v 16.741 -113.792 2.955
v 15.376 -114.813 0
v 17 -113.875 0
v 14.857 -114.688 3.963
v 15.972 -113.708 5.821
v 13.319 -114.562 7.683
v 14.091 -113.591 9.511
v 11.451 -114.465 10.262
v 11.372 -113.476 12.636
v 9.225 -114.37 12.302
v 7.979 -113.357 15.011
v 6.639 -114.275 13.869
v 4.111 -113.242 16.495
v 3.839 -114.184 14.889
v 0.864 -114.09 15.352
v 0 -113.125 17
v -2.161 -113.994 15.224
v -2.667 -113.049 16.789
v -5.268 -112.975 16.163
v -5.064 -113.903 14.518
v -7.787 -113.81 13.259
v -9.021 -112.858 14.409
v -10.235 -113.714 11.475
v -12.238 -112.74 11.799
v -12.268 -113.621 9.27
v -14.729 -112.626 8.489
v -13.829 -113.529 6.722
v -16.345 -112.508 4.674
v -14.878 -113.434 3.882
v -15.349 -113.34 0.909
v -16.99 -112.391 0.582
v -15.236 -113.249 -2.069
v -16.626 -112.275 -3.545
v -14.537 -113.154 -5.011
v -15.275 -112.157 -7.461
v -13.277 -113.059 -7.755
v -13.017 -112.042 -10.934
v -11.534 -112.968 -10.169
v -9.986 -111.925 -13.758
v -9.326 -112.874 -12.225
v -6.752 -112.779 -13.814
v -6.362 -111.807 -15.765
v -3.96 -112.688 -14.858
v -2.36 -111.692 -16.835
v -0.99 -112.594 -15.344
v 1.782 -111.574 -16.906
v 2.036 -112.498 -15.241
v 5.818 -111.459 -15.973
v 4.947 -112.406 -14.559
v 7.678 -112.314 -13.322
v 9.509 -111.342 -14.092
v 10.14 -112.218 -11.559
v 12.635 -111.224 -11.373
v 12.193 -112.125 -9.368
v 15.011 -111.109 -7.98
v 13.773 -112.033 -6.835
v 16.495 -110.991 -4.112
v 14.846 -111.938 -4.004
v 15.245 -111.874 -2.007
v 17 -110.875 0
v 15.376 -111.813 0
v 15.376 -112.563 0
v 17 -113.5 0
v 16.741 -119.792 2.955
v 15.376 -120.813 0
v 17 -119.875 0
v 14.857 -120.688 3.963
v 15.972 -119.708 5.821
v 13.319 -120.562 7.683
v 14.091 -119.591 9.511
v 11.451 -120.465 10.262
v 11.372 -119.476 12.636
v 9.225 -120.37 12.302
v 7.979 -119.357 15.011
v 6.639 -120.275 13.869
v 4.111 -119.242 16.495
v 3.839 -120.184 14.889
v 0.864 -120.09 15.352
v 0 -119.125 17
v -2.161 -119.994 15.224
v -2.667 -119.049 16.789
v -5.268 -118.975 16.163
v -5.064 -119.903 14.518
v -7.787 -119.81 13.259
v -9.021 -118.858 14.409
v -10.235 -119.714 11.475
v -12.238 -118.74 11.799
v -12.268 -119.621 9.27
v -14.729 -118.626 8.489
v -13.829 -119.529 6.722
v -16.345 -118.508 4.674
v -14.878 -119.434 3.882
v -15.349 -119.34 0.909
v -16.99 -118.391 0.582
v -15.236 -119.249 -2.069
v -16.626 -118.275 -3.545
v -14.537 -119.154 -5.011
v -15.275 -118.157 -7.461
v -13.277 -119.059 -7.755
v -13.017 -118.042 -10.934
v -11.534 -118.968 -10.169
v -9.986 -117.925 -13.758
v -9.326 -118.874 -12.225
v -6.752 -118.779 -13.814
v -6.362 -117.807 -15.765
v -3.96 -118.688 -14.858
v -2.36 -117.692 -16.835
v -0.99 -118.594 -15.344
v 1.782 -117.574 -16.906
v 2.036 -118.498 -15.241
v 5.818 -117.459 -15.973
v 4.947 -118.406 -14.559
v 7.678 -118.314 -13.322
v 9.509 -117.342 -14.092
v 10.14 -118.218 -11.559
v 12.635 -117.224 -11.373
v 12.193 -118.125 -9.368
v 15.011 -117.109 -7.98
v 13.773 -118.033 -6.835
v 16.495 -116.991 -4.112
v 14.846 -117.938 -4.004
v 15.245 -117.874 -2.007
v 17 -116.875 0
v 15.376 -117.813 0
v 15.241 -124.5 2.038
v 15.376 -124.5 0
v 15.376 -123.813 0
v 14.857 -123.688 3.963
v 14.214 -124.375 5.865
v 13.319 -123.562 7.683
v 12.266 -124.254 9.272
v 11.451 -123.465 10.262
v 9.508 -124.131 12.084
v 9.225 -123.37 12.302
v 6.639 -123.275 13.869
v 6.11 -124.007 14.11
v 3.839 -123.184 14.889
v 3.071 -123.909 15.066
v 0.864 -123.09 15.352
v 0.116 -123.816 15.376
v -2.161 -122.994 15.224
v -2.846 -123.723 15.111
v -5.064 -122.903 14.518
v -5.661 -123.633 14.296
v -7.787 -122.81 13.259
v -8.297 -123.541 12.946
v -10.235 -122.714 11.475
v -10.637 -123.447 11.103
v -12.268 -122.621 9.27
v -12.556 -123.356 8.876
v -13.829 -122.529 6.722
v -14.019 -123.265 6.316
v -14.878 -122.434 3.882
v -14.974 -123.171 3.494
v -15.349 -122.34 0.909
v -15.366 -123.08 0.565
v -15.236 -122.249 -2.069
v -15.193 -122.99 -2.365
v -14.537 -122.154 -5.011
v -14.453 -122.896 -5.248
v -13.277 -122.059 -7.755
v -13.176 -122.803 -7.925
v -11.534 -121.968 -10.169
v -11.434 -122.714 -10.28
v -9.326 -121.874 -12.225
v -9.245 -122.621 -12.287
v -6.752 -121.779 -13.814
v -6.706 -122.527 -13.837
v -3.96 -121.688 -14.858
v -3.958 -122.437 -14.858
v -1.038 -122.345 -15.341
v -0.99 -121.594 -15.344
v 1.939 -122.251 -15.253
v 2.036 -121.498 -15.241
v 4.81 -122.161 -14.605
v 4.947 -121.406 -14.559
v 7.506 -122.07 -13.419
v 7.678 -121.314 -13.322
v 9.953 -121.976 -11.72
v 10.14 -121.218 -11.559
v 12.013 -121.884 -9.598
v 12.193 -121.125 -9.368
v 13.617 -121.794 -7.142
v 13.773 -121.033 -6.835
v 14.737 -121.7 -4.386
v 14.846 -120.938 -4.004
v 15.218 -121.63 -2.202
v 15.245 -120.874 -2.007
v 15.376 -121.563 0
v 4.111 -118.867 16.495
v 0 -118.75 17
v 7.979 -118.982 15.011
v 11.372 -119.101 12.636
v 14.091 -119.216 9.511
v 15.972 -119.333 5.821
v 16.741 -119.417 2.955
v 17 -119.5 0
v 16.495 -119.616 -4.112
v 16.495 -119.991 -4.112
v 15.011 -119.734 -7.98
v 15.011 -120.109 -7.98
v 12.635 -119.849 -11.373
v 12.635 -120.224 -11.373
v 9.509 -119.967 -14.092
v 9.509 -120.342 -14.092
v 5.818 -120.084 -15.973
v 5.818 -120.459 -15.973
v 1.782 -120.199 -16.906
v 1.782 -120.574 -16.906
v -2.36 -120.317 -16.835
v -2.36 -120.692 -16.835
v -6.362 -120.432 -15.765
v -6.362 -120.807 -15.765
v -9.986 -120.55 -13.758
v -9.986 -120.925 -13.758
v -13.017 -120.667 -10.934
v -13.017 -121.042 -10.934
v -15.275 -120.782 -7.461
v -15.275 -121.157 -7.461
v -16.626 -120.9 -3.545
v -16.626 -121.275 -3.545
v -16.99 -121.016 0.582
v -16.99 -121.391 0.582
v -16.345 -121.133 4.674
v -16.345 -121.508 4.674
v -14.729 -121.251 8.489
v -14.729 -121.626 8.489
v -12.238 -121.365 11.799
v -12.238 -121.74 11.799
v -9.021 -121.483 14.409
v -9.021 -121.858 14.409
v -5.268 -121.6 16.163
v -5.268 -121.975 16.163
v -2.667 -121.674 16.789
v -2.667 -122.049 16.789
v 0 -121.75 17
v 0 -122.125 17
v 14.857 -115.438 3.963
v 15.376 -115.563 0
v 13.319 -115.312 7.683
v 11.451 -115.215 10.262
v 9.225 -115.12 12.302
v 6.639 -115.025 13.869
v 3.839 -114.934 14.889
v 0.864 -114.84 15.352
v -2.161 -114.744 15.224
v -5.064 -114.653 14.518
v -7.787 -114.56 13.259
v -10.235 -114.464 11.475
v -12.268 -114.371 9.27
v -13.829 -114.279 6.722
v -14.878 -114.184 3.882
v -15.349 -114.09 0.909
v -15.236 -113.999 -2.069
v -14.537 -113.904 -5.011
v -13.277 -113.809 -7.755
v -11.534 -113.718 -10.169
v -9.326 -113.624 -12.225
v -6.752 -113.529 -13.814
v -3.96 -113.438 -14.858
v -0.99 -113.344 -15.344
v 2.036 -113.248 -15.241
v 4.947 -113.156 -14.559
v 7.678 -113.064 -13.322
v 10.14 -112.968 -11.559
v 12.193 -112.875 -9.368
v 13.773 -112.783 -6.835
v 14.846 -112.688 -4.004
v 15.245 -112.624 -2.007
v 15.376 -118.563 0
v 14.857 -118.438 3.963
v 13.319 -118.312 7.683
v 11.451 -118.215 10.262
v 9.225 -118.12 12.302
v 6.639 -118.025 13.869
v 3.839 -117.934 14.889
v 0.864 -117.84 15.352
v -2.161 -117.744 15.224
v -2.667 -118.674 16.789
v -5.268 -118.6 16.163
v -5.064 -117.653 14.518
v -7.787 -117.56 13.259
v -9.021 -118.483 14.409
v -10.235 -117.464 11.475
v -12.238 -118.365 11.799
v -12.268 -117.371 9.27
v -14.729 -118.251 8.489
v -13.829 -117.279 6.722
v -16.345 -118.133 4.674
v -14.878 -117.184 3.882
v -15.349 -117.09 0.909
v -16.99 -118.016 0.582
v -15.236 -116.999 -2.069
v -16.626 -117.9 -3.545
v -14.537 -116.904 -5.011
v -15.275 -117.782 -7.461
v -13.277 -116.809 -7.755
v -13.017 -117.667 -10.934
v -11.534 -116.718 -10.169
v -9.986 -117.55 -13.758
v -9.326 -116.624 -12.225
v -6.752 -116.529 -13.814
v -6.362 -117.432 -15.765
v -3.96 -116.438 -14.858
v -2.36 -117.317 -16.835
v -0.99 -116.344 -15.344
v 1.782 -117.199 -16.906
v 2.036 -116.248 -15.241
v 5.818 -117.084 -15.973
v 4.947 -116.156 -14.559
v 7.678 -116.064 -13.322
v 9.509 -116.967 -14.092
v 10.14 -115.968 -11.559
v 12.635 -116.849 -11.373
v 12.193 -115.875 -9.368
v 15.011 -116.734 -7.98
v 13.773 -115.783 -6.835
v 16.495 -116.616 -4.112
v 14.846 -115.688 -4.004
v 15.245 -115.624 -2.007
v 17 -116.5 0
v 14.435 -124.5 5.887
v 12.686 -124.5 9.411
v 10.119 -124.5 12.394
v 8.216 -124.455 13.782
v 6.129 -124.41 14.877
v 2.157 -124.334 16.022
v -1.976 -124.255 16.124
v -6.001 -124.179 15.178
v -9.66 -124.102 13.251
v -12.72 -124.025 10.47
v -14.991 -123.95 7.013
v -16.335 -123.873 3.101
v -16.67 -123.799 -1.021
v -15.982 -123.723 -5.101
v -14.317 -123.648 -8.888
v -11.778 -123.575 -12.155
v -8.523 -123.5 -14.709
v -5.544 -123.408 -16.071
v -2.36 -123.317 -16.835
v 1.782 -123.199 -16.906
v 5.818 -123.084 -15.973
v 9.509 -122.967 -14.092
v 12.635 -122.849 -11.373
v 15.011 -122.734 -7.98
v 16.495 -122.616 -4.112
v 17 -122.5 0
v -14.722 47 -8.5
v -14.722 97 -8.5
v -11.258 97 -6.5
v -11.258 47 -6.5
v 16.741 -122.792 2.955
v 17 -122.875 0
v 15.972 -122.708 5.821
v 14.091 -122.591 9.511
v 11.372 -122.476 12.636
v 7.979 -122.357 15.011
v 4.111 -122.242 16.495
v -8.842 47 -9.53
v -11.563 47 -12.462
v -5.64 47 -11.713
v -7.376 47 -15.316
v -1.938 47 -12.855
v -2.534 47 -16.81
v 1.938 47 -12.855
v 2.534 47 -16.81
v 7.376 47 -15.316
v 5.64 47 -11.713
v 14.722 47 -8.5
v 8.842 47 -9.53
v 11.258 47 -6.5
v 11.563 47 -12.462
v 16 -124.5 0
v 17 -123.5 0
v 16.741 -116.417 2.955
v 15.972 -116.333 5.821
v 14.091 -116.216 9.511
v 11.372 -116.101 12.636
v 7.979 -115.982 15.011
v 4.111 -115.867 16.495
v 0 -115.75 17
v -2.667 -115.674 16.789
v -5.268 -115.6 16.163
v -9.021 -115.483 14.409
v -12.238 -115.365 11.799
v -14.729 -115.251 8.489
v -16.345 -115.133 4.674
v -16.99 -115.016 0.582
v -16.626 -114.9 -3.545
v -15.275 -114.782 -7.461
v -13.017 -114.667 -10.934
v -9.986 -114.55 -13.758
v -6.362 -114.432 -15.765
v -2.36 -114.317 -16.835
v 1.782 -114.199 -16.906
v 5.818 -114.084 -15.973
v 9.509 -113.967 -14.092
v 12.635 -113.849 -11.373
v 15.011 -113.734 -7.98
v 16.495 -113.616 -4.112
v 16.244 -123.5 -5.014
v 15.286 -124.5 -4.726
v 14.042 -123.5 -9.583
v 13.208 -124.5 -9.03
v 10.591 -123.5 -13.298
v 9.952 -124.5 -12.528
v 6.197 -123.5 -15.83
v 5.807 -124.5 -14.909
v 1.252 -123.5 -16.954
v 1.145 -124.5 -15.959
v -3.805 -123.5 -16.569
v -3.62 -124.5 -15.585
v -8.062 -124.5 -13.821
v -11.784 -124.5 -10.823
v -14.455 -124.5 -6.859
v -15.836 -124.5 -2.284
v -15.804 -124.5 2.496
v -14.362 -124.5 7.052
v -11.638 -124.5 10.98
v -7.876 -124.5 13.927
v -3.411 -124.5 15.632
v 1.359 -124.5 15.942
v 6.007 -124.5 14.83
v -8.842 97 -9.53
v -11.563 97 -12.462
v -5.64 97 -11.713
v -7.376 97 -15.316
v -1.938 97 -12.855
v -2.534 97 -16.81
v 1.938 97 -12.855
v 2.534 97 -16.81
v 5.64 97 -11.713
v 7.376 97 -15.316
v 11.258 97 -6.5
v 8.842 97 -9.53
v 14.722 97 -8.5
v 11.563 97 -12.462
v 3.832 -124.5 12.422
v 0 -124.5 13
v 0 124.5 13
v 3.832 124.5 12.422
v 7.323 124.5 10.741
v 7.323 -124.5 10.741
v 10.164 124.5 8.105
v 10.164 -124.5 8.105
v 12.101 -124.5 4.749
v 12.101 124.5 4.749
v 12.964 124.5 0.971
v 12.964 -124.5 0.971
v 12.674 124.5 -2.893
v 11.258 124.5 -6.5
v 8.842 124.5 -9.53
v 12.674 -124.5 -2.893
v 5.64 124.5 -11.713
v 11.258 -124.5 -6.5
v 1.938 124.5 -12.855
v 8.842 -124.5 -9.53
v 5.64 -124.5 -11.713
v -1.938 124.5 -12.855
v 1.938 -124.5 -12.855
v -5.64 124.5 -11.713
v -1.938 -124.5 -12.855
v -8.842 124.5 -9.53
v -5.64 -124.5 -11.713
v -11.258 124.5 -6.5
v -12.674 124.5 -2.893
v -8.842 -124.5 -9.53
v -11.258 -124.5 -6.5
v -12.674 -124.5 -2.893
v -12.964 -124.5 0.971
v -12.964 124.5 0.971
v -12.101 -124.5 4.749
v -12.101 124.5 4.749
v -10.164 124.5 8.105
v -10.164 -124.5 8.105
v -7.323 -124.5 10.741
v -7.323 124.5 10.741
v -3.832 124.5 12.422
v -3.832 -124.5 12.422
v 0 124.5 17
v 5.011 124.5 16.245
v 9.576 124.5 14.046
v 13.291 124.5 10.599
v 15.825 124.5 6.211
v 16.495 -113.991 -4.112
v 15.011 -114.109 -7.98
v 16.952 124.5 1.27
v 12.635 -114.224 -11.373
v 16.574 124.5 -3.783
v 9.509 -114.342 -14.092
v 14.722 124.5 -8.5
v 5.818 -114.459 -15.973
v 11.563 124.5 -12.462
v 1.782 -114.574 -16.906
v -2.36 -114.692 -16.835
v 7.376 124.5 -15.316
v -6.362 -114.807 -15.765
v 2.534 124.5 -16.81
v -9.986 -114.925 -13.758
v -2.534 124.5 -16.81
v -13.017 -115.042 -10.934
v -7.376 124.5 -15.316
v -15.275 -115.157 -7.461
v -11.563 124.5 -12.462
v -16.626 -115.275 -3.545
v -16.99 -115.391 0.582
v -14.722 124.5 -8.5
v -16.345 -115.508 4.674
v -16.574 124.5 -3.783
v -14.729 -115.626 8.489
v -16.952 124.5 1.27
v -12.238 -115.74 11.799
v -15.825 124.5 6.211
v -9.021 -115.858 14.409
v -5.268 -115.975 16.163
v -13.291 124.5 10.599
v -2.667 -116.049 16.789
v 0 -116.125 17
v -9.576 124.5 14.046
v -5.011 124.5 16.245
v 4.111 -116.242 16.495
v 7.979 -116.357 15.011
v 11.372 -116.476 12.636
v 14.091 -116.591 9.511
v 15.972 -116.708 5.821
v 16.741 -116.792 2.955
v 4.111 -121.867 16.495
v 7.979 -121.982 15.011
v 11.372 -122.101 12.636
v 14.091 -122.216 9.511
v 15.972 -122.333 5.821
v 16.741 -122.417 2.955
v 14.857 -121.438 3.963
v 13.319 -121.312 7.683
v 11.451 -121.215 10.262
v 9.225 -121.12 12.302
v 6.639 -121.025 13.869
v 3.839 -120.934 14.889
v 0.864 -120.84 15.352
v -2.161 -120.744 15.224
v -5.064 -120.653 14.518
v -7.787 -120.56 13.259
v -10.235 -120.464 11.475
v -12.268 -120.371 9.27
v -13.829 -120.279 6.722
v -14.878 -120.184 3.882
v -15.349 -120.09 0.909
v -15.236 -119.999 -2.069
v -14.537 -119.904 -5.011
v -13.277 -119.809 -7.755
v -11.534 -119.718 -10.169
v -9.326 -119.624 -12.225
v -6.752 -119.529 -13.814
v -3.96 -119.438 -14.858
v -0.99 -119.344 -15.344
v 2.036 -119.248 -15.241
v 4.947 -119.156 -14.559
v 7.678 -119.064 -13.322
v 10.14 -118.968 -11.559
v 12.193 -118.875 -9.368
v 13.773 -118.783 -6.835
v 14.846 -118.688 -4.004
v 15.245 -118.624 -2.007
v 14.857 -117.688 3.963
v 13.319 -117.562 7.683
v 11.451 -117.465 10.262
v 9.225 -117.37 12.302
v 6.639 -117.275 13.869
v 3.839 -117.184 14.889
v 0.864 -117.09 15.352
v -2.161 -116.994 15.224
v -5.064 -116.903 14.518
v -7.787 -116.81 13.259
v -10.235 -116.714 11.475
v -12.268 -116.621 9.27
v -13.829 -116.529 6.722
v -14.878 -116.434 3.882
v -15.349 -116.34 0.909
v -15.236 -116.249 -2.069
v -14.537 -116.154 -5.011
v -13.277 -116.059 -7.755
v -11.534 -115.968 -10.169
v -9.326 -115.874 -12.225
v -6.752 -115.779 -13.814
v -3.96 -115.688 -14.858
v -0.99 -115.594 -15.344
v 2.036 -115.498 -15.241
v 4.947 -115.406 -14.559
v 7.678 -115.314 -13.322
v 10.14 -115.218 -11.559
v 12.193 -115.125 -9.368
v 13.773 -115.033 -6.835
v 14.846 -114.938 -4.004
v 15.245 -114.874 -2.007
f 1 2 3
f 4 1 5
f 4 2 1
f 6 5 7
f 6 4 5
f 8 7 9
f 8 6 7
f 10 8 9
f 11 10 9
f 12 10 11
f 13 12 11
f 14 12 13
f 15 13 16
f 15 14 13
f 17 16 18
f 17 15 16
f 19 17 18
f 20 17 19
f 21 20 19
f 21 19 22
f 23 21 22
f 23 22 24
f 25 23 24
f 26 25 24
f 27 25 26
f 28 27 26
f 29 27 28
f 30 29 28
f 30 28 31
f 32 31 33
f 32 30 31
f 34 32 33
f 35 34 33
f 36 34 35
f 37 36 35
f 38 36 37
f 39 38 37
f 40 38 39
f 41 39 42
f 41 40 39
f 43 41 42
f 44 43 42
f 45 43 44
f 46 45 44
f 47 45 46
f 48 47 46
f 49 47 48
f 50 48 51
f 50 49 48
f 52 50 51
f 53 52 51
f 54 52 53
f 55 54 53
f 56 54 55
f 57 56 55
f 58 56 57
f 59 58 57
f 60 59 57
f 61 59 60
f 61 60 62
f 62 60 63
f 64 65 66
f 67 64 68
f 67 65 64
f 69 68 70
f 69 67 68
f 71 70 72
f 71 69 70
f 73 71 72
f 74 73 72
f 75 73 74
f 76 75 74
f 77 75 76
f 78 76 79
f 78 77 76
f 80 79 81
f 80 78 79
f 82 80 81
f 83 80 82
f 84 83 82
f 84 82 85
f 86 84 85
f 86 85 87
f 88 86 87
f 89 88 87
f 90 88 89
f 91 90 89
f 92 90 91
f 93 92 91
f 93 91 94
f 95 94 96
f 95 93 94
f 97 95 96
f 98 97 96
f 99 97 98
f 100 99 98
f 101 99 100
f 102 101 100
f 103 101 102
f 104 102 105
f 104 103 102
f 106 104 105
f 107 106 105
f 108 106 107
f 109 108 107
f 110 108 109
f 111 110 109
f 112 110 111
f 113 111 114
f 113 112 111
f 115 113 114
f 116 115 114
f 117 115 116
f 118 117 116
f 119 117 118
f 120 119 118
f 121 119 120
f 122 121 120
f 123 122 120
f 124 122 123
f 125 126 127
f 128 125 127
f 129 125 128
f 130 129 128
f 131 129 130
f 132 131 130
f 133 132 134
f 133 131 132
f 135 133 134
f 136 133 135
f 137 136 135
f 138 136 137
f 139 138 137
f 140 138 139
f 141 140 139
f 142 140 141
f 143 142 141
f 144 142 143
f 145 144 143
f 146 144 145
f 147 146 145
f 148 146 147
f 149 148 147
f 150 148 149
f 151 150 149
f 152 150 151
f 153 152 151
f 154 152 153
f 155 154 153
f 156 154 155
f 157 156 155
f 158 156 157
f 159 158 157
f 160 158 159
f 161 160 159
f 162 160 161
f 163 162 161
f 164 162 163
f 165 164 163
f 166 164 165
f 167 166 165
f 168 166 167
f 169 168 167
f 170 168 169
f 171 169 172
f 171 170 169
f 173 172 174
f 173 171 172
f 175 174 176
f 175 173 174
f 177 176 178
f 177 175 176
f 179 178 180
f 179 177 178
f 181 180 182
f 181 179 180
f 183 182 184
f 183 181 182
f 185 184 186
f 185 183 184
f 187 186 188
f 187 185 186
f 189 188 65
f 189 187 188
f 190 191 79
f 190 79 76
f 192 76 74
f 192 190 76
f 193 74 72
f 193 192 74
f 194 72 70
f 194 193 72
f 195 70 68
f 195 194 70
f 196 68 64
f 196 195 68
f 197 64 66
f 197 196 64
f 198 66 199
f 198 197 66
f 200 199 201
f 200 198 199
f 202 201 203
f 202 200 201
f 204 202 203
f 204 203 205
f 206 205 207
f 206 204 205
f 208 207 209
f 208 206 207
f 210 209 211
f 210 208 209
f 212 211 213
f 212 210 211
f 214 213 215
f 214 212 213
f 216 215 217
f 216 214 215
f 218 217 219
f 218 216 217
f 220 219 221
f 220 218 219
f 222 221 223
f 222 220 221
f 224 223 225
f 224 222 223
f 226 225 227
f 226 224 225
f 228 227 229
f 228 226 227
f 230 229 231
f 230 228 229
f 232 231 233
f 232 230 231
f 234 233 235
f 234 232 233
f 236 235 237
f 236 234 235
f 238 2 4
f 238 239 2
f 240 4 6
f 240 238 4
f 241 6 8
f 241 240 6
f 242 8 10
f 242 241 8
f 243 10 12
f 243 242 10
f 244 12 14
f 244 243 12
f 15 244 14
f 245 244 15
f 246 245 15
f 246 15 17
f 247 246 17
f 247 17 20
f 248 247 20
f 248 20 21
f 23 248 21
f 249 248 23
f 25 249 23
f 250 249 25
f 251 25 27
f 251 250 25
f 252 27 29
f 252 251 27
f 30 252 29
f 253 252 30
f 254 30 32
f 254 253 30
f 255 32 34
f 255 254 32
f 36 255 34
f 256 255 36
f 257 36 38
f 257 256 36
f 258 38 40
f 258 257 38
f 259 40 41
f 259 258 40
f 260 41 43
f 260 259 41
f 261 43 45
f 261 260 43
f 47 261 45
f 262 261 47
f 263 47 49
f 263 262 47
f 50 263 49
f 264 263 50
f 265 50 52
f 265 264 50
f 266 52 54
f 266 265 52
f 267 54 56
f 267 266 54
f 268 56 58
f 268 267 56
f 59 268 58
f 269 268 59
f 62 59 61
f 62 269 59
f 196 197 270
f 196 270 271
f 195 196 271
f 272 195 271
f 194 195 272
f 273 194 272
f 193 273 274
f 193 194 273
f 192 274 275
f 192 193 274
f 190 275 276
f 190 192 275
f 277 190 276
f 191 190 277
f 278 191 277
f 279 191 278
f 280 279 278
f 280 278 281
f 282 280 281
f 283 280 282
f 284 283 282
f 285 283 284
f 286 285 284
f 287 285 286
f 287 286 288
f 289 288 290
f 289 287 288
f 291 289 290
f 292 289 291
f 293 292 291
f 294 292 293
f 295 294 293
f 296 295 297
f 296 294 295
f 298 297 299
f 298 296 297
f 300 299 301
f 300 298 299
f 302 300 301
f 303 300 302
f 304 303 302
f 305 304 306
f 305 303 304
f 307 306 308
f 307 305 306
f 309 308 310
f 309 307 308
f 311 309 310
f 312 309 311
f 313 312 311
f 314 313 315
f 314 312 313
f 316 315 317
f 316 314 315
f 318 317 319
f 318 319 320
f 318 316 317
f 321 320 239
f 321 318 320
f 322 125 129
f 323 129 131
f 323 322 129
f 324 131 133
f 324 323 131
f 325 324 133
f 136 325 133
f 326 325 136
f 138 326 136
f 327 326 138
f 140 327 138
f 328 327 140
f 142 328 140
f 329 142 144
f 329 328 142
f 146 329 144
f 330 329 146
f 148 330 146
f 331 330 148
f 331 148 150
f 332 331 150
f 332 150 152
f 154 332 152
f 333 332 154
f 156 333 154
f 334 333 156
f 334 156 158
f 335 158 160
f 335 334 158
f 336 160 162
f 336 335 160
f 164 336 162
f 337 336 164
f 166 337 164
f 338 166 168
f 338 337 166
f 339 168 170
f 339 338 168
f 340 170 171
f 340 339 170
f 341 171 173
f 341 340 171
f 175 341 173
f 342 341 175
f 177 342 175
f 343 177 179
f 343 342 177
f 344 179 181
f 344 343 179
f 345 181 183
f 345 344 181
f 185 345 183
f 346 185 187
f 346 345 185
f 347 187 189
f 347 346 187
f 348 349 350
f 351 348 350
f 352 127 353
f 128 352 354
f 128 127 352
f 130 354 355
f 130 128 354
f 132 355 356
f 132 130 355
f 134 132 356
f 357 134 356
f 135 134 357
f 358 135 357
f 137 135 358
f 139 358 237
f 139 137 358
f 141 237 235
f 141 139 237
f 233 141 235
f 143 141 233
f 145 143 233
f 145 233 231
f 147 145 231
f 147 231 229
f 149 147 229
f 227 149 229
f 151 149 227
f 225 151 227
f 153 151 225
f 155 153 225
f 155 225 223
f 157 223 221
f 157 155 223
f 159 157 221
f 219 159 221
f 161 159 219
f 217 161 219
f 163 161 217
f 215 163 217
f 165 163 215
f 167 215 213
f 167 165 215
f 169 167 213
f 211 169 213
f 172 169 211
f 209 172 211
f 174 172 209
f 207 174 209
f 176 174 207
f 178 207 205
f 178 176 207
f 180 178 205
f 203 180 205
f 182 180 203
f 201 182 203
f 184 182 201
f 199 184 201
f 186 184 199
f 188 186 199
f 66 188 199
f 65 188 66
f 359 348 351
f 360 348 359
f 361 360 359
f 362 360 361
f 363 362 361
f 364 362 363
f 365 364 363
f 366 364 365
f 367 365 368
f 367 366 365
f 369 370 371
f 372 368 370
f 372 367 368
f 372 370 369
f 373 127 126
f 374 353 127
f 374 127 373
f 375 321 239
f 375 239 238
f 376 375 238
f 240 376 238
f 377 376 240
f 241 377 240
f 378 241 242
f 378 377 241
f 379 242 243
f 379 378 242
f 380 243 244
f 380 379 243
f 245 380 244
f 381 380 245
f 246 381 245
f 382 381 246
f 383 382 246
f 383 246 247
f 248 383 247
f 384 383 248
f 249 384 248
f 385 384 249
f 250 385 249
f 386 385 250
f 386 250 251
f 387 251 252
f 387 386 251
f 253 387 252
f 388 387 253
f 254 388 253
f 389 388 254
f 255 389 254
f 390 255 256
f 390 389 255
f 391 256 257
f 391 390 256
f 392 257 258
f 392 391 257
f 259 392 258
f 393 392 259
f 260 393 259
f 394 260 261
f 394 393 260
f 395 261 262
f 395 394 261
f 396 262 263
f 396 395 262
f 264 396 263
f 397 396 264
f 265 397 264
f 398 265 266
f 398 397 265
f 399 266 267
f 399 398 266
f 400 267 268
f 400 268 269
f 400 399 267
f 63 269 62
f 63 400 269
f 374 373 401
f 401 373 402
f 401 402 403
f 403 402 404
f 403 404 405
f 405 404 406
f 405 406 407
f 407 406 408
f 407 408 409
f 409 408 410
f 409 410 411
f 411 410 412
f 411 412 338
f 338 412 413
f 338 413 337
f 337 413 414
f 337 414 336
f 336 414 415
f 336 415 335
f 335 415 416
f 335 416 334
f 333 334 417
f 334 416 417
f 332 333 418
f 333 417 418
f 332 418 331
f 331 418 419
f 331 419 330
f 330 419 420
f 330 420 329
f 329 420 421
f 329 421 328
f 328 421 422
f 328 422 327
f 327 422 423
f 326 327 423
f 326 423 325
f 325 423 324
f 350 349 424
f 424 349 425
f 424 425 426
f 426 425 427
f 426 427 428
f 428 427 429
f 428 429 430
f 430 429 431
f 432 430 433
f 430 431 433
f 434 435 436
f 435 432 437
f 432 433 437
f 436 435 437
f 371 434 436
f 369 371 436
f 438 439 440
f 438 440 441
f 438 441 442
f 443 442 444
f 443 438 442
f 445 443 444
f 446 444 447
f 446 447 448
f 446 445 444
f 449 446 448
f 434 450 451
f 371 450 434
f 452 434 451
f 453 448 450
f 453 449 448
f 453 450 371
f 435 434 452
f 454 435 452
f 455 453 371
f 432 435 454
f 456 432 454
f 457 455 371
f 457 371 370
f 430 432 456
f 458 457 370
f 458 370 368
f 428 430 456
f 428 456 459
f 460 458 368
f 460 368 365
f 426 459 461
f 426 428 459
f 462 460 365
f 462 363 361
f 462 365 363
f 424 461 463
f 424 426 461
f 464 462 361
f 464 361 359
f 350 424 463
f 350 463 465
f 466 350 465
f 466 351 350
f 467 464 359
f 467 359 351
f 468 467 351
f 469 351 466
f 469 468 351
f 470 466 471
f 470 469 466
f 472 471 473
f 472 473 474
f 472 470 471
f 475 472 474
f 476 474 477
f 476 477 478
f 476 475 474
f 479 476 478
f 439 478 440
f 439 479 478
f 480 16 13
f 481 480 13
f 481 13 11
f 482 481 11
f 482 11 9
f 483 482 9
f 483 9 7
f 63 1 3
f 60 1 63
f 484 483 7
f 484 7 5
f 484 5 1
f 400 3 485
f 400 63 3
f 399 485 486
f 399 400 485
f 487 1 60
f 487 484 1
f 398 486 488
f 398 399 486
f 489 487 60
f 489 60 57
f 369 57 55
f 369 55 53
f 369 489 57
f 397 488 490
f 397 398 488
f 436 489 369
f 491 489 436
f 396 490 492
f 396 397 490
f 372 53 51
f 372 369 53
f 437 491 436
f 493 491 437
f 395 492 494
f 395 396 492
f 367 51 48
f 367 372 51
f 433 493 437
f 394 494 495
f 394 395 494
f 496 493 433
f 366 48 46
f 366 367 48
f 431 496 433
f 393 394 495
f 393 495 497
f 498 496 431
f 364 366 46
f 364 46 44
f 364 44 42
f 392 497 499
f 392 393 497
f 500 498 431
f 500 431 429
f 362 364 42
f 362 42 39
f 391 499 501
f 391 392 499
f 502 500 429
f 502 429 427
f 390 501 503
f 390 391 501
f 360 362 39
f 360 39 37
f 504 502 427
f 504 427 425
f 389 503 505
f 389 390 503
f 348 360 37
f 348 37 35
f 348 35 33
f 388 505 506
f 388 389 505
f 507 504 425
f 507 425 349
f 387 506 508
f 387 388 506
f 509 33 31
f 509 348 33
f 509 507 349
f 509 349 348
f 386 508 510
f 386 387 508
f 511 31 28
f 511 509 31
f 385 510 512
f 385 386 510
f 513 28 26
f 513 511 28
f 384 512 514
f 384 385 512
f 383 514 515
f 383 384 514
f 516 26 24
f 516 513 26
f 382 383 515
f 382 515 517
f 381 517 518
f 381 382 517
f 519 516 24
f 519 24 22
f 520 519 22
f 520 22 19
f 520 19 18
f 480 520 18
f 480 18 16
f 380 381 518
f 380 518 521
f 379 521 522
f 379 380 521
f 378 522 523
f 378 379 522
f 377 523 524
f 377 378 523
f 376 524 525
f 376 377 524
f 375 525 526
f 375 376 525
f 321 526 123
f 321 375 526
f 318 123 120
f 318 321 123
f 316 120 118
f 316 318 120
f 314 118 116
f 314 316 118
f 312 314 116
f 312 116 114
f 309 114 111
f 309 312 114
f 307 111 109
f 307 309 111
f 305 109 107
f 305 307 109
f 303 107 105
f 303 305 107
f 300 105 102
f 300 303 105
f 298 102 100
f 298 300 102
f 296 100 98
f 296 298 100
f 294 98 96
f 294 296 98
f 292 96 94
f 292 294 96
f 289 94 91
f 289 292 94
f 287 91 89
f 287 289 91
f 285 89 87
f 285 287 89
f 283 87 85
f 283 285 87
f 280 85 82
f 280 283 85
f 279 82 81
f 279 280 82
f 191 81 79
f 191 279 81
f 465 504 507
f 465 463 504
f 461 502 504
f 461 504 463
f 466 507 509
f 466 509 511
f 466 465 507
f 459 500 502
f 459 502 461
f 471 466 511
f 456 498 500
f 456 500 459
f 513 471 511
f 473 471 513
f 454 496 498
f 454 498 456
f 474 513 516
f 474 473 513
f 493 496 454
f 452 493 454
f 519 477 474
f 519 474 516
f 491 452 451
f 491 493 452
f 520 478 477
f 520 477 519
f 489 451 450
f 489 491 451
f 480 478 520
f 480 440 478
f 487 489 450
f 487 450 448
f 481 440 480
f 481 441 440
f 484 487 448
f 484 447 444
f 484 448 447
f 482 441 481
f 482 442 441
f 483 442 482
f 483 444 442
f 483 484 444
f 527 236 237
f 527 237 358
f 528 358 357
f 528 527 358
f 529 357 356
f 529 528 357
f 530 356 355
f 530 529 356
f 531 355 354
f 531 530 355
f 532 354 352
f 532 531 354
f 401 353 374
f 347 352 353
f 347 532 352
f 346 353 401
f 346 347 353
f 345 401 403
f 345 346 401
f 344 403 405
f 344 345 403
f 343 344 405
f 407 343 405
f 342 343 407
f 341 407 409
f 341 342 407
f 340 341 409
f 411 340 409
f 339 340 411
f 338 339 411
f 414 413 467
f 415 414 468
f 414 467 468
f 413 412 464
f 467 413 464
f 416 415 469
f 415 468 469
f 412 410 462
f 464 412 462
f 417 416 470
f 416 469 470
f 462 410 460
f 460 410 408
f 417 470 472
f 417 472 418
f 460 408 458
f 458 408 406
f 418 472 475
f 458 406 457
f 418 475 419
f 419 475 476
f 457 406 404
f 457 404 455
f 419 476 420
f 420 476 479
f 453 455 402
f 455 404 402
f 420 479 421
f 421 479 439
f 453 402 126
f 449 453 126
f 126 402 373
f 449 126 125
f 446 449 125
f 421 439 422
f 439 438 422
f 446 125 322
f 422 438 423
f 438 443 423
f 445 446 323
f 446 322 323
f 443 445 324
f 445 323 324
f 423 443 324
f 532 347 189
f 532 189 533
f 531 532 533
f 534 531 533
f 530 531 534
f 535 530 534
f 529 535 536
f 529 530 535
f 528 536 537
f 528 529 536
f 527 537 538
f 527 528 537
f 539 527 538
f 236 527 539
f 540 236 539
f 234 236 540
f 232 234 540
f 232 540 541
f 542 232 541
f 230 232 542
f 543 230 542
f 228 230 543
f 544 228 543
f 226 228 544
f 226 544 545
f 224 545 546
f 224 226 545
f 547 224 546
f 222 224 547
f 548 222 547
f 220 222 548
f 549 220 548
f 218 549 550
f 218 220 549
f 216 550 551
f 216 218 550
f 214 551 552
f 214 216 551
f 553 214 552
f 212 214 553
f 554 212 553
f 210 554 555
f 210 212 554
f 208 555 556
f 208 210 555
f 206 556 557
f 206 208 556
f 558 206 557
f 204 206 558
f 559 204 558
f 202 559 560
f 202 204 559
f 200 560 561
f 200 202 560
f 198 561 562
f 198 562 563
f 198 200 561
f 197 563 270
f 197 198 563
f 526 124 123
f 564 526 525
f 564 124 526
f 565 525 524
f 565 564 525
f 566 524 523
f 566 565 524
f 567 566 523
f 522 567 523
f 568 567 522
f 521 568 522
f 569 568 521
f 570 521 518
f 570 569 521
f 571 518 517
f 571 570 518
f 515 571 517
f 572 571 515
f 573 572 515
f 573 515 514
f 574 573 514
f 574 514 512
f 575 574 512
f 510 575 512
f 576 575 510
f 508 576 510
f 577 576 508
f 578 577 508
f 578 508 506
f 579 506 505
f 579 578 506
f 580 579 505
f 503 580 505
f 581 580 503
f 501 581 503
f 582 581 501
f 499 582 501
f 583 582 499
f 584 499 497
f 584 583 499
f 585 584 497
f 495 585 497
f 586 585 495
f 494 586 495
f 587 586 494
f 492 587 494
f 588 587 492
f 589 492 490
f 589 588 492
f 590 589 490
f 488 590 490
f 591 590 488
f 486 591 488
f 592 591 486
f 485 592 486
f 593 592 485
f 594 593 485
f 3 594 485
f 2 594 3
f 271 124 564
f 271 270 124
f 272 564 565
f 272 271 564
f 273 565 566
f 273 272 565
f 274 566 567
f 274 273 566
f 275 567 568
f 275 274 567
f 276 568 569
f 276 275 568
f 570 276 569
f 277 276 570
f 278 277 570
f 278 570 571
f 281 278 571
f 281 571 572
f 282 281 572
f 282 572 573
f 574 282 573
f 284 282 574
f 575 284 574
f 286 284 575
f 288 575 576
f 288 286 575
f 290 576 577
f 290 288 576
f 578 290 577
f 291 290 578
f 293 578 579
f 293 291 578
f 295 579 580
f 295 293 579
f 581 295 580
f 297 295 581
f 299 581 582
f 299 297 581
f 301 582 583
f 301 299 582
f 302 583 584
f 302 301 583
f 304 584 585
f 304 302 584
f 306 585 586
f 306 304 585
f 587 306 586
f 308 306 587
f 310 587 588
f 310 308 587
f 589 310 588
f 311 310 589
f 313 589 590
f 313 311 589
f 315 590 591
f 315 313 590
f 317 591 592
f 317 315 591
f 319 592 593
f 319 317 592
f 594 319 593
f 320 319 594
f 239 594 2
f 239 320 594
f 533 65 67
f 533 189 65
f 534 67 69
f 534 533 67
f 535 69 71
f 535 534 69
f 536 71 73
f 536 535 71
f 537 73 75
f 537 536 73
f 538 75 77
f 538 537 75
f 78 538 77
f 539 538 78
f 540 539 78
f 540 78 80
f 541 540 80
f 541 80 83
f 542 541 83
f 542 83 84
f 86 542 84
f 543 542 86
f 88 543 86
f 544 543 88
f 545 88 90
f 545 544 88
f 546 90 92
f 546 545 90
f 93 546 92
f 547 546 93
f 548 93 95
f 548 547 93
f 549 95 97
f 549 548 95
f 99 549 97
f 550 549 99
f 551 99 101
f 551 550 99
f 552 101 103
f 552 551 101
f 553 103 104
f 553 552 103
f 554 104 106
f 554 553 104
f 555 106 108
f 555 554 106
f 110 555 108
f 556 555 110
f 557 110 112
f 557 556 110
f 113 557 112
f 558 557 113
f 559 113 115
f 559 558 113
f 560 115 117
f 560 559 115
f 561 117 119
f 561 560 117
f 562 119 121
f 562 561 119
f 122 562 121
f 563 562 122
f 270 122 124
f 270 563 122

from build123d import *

# Parameters (mm, degrees)
SKETCH1_R           = 17
SKETCH1_R_2         = 13
BOSS_EXTRUDE1_DEPTH = 124.5
CUT_EXTRUDE2_START  = 10
CUT_EXTRUDE2_DEPTH  = 50
THREAD1_PITCH       = 3
CHAMFER2_SIZE       = 1


with BuildPart() as part:
    # Sketch1 → Boss-Extrude1 (new, symmetric)
    with BuildSketch(Plane(origin=(0, 0, 0), x_dir=(1, 0, 0), z_dir=(0, 1, 0))):
        with Locations(Location((0, 0, 0), (0, 0, 270))):
            Circle(SKETCH1_R)
        with Locations(Location((0, 0, 0), (0, 0, 270))):
            Circle(SKETCH1_R_2, mode=Mode.SUBTRACT)
    extrude(amount=BOSS_EXTRUDE1_DEPTH, both=True)

    # Sketch3 → Cut-Extrude2 (cut)
    with BuildSketch(Plane(origin=(0, 87, 0), x_dir=(1, 0, 0), z_dir=(0, 1, 0)).offset(CUT_EXTRUDE2_START)):
        with BuildLine():
            Line((0, 0), (14.722431864, 8.5))
            ThreePointArc((14.722431864, 8.5), (0, 17), (-14.722431864, 8.5))
            Line((-14.722431864, 8.5), (0, 0))
        make_face()
    extrude(amount=-CUT_EXTRUDE2_DEPTH, mode=Mode.SUBTRACT)

    # Thread1: the profile of Thread Profile1 profile screwed along a left-hand helix of 4 turns, 10 arcs to a turn; built about Z, then put on its axis
    thread1_z = Axis((0, 0, 0), (0, 0, 1))
    thread1_corners = [(17.0003, 0, -0.000173205), (17.0003, 0, 2.625173197), (15.376202375, 0, 1.687499996), (15.376202375, 0, 0.937499996)]
    with BuildLine(mode=Mode.PRIVATE) as thread1_profile:
        Line(thread1_corners[0], thread1_corners[1])
        Line(thread1_corners[1], thread1_corners[2])
        Line(thread1_corners[2], thread1_corners[3])
        Line(thread1_corners[3], thread1_corners[0])
    thread1_cap = Face(thread1_profile.wire())
    thread1_turn_angles = [0, -18, -36, -54, -72, -90, -108, -126, -144, -162, -180, -198, -216, -234, -252, -270, -288, -306, -324, -342, -360]
    thread1_turn_weights = [1, 0.9510565162951535, 1, 0.9510565162951535, 1, 0.9510565162951535, 1, 0.9510565162951535, 1, 0.9510565162951535, 1, 0.9510565162951535, 1, 0.9510565162951535, 1, 0.9510565162951535, 1, 0.9510565162951535, 1, 0.9510565162951535, 1]
    thread1_turn_rails = [Edge.make_bspline([Vector(p[0], p[1], 0).rotate(thread1_z, thread1_turn_angles[k]) / thread1_turn_weights[k] + Vector(0, 0, p[2] + -THREAD1_PITCH * thread1_turn_angles[k] / 360) for k in range(21)], [0, 0, 0, 1, 1, 2, 2, 3, 3, 4, 4, 5, 5, 6, 6, 7, 7, 8, 8, 9, 9, 10, 10, 10], 2, thread1_turn_weights) for p in thread1_corners]
    thread1_turn_sides = [Face.make_surface_from_curves(thread1_turn_rails[p[0]], thread1_turn_rails[p[1]]) for p in [(0, 1), (1, 2), (2, 3), (3, 0)]]
    thread1 = Plane(origin=(0, -125.5, 0), x_dir=(1, 0, 0), z_dir=(0, 1, 0)) * Solid(Shell([*[p.moved(Location((0, 0, THREAD1_PITCH * i))) for i in range(4) for p in thread1_turn_sides], thread1_cap, thread1_cap.rotate(thread1_z, -1440).moved(Location((0, 0, -THREAD1_PITCH * -1440 / 360)))]))
    add(thread1, mode=Mode.SUBTRACT)

    # Chamfer2
    chamfer2_edges = [part.edges().sort_by_distance(p)[0] for p in [
        (-8.48872702, -124.5, -14.728934571),
    ]]
    chamfer(chamfer2_edges, length=CHAMFER2_SIZE)


solid = part.part
